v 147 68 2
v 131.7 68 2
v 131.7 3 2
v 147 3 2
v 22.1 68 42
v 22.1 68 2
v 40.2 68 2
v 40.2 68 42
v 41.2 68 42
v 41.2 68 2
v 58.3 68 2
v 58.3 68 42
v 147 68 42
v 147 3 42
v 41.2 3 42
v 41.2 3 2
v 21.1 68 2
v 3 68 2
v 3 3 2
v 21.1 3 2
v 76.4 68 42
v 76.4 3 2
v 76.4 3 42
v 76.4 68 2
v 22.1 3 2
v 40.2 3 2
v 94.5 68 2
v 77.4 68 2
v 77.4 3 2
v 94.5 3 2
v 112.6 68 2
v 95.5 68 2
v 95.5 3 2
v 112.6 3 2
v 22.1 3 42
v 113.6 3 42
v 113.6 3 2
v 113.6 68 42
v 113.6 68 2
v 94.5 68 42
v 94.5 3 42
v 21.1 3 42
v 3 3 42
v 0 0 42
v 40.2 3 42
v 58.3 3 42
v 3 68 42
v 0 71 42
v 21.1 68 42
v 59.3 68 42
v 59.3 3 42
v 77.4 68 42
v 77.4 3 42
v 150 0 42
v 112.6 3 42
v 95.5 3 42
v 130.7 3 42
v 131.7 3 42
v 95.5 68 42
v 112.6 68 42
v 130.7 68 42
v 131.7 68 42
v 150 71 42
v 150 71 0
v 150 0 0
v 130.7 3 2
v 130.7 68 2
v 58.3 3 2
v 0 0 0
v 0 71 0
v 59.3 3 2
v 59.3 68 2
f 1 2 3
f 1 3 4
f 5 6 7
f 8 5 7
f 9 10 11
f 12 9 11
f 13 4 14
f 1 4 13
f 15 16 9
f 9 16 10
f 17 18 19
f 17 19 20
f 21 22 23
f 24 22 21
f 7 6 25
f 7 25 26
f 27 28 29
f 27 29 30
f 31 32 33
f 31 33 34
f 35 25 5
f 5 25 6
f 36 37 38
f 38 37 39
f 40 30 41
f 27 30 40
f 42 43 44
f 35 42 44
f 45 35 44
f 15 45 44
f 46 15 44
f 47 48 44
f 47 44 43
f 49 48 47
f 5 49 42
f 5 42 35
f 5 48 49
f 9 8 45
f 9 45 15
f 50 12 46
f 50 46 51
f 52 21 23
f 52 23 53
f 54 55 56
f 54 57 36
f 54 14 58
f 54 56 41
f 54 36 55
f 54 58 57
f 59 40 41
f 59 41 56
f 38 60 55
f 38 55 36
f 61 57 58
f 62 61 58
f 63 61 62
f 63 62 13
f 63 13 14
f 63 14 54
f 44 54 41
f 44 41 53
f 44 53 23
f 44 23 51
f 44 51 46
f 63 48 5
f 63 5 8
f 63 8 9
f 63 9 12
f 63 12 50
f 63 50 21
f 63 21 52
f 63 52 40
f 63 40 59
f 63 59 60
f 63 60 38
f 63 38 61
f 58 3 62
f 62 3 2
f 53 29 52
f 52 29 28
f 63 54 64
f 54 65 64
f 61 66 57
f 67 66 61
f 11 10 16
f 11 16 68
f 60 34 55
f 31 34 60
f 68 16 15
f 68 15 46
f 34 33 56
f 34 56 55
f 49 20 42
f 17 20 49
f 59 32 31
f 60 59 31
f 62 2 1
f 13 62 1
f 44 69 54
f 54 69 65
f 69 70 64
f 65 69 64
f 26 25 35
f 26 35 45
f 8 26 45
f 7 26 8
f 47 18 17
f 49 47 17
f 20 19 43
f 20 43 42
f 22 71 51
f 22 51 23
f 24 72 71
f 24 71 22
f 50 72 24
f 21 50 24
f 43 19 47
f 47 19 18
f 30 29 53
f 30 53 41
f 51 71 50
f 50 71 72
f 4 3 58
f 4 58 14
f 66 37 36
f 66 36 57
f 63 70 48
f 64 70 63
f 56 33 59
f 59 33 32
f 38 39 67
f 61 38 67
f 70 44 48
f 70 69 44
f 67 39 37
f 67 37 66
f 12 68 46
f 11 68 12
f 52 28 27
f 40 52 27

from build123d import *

# Parameters (mm, degrees)
F0_W     = 150
F0_H     = 71
F1_DEPTH = 2
F2_W     = 150
F2_H     = 71
F2_W_2   = 144
F2_H_2   = 65
F3_DEPTH = 40
F4_W     = 1
F4_H     = 65
F5_DEPTH = 40
F6_W     = 1
F6_H     = 65
F7_DEPTH = 40


with BuildPart() as f1:
    # F0 (on Top) → F1 (new body)
    with BuildSketch(Plane.XY):
        with Locations((75, 35.5)):
            Rectangle(F0_W, F0_H)
    extrude(amount=F1_DEPTH)

    # F2 (on face) → F3 (join)
    with BuildSketch(Plane.XY.offset(2)):
        with Locations((75, 35.5)):
            Rectangle(F2_W, F2_H)
        with Locations((75, 35.5)):
            Rectangle(F2_W_2, F2_H_2, mode=Mode.SUBTRACT)
    extrude(amount=F3_DEPTH)

    # F4 (on face) → F5 (join)
    with BuildSketch(Plane.XY.offset(2)):
        with Locations((21.6, 35.5)):
            Rectangle(F4_W, F4_H)
    extrude(amount=F5_DEPTH)

    # F6 (on face) → F7 (join)
    with BuildSketch(Plane.XY.offset(2)):
        with Locations((40.7, 35.5)):
            Rectangle(F6_W, F6_H)
        with Locations((58.8, 35.5)):
            Rectangle(F6_W, F6_H)
        with Locations((76.9, 35.5)):
            Rectangle(F6_W, F6_H)
        with Locations((95, 35.5)):
            Rectangle(F6_W, F6_H)
        with Locations((113.1, 35.5)):
            Rectangle(F6_W, F6_H)
        with Locations((131.2, 35.5)):
            Rectangle(F6_W, F6_H)
    extrude(amount=F7_DEPTH)


solid = f1.part
